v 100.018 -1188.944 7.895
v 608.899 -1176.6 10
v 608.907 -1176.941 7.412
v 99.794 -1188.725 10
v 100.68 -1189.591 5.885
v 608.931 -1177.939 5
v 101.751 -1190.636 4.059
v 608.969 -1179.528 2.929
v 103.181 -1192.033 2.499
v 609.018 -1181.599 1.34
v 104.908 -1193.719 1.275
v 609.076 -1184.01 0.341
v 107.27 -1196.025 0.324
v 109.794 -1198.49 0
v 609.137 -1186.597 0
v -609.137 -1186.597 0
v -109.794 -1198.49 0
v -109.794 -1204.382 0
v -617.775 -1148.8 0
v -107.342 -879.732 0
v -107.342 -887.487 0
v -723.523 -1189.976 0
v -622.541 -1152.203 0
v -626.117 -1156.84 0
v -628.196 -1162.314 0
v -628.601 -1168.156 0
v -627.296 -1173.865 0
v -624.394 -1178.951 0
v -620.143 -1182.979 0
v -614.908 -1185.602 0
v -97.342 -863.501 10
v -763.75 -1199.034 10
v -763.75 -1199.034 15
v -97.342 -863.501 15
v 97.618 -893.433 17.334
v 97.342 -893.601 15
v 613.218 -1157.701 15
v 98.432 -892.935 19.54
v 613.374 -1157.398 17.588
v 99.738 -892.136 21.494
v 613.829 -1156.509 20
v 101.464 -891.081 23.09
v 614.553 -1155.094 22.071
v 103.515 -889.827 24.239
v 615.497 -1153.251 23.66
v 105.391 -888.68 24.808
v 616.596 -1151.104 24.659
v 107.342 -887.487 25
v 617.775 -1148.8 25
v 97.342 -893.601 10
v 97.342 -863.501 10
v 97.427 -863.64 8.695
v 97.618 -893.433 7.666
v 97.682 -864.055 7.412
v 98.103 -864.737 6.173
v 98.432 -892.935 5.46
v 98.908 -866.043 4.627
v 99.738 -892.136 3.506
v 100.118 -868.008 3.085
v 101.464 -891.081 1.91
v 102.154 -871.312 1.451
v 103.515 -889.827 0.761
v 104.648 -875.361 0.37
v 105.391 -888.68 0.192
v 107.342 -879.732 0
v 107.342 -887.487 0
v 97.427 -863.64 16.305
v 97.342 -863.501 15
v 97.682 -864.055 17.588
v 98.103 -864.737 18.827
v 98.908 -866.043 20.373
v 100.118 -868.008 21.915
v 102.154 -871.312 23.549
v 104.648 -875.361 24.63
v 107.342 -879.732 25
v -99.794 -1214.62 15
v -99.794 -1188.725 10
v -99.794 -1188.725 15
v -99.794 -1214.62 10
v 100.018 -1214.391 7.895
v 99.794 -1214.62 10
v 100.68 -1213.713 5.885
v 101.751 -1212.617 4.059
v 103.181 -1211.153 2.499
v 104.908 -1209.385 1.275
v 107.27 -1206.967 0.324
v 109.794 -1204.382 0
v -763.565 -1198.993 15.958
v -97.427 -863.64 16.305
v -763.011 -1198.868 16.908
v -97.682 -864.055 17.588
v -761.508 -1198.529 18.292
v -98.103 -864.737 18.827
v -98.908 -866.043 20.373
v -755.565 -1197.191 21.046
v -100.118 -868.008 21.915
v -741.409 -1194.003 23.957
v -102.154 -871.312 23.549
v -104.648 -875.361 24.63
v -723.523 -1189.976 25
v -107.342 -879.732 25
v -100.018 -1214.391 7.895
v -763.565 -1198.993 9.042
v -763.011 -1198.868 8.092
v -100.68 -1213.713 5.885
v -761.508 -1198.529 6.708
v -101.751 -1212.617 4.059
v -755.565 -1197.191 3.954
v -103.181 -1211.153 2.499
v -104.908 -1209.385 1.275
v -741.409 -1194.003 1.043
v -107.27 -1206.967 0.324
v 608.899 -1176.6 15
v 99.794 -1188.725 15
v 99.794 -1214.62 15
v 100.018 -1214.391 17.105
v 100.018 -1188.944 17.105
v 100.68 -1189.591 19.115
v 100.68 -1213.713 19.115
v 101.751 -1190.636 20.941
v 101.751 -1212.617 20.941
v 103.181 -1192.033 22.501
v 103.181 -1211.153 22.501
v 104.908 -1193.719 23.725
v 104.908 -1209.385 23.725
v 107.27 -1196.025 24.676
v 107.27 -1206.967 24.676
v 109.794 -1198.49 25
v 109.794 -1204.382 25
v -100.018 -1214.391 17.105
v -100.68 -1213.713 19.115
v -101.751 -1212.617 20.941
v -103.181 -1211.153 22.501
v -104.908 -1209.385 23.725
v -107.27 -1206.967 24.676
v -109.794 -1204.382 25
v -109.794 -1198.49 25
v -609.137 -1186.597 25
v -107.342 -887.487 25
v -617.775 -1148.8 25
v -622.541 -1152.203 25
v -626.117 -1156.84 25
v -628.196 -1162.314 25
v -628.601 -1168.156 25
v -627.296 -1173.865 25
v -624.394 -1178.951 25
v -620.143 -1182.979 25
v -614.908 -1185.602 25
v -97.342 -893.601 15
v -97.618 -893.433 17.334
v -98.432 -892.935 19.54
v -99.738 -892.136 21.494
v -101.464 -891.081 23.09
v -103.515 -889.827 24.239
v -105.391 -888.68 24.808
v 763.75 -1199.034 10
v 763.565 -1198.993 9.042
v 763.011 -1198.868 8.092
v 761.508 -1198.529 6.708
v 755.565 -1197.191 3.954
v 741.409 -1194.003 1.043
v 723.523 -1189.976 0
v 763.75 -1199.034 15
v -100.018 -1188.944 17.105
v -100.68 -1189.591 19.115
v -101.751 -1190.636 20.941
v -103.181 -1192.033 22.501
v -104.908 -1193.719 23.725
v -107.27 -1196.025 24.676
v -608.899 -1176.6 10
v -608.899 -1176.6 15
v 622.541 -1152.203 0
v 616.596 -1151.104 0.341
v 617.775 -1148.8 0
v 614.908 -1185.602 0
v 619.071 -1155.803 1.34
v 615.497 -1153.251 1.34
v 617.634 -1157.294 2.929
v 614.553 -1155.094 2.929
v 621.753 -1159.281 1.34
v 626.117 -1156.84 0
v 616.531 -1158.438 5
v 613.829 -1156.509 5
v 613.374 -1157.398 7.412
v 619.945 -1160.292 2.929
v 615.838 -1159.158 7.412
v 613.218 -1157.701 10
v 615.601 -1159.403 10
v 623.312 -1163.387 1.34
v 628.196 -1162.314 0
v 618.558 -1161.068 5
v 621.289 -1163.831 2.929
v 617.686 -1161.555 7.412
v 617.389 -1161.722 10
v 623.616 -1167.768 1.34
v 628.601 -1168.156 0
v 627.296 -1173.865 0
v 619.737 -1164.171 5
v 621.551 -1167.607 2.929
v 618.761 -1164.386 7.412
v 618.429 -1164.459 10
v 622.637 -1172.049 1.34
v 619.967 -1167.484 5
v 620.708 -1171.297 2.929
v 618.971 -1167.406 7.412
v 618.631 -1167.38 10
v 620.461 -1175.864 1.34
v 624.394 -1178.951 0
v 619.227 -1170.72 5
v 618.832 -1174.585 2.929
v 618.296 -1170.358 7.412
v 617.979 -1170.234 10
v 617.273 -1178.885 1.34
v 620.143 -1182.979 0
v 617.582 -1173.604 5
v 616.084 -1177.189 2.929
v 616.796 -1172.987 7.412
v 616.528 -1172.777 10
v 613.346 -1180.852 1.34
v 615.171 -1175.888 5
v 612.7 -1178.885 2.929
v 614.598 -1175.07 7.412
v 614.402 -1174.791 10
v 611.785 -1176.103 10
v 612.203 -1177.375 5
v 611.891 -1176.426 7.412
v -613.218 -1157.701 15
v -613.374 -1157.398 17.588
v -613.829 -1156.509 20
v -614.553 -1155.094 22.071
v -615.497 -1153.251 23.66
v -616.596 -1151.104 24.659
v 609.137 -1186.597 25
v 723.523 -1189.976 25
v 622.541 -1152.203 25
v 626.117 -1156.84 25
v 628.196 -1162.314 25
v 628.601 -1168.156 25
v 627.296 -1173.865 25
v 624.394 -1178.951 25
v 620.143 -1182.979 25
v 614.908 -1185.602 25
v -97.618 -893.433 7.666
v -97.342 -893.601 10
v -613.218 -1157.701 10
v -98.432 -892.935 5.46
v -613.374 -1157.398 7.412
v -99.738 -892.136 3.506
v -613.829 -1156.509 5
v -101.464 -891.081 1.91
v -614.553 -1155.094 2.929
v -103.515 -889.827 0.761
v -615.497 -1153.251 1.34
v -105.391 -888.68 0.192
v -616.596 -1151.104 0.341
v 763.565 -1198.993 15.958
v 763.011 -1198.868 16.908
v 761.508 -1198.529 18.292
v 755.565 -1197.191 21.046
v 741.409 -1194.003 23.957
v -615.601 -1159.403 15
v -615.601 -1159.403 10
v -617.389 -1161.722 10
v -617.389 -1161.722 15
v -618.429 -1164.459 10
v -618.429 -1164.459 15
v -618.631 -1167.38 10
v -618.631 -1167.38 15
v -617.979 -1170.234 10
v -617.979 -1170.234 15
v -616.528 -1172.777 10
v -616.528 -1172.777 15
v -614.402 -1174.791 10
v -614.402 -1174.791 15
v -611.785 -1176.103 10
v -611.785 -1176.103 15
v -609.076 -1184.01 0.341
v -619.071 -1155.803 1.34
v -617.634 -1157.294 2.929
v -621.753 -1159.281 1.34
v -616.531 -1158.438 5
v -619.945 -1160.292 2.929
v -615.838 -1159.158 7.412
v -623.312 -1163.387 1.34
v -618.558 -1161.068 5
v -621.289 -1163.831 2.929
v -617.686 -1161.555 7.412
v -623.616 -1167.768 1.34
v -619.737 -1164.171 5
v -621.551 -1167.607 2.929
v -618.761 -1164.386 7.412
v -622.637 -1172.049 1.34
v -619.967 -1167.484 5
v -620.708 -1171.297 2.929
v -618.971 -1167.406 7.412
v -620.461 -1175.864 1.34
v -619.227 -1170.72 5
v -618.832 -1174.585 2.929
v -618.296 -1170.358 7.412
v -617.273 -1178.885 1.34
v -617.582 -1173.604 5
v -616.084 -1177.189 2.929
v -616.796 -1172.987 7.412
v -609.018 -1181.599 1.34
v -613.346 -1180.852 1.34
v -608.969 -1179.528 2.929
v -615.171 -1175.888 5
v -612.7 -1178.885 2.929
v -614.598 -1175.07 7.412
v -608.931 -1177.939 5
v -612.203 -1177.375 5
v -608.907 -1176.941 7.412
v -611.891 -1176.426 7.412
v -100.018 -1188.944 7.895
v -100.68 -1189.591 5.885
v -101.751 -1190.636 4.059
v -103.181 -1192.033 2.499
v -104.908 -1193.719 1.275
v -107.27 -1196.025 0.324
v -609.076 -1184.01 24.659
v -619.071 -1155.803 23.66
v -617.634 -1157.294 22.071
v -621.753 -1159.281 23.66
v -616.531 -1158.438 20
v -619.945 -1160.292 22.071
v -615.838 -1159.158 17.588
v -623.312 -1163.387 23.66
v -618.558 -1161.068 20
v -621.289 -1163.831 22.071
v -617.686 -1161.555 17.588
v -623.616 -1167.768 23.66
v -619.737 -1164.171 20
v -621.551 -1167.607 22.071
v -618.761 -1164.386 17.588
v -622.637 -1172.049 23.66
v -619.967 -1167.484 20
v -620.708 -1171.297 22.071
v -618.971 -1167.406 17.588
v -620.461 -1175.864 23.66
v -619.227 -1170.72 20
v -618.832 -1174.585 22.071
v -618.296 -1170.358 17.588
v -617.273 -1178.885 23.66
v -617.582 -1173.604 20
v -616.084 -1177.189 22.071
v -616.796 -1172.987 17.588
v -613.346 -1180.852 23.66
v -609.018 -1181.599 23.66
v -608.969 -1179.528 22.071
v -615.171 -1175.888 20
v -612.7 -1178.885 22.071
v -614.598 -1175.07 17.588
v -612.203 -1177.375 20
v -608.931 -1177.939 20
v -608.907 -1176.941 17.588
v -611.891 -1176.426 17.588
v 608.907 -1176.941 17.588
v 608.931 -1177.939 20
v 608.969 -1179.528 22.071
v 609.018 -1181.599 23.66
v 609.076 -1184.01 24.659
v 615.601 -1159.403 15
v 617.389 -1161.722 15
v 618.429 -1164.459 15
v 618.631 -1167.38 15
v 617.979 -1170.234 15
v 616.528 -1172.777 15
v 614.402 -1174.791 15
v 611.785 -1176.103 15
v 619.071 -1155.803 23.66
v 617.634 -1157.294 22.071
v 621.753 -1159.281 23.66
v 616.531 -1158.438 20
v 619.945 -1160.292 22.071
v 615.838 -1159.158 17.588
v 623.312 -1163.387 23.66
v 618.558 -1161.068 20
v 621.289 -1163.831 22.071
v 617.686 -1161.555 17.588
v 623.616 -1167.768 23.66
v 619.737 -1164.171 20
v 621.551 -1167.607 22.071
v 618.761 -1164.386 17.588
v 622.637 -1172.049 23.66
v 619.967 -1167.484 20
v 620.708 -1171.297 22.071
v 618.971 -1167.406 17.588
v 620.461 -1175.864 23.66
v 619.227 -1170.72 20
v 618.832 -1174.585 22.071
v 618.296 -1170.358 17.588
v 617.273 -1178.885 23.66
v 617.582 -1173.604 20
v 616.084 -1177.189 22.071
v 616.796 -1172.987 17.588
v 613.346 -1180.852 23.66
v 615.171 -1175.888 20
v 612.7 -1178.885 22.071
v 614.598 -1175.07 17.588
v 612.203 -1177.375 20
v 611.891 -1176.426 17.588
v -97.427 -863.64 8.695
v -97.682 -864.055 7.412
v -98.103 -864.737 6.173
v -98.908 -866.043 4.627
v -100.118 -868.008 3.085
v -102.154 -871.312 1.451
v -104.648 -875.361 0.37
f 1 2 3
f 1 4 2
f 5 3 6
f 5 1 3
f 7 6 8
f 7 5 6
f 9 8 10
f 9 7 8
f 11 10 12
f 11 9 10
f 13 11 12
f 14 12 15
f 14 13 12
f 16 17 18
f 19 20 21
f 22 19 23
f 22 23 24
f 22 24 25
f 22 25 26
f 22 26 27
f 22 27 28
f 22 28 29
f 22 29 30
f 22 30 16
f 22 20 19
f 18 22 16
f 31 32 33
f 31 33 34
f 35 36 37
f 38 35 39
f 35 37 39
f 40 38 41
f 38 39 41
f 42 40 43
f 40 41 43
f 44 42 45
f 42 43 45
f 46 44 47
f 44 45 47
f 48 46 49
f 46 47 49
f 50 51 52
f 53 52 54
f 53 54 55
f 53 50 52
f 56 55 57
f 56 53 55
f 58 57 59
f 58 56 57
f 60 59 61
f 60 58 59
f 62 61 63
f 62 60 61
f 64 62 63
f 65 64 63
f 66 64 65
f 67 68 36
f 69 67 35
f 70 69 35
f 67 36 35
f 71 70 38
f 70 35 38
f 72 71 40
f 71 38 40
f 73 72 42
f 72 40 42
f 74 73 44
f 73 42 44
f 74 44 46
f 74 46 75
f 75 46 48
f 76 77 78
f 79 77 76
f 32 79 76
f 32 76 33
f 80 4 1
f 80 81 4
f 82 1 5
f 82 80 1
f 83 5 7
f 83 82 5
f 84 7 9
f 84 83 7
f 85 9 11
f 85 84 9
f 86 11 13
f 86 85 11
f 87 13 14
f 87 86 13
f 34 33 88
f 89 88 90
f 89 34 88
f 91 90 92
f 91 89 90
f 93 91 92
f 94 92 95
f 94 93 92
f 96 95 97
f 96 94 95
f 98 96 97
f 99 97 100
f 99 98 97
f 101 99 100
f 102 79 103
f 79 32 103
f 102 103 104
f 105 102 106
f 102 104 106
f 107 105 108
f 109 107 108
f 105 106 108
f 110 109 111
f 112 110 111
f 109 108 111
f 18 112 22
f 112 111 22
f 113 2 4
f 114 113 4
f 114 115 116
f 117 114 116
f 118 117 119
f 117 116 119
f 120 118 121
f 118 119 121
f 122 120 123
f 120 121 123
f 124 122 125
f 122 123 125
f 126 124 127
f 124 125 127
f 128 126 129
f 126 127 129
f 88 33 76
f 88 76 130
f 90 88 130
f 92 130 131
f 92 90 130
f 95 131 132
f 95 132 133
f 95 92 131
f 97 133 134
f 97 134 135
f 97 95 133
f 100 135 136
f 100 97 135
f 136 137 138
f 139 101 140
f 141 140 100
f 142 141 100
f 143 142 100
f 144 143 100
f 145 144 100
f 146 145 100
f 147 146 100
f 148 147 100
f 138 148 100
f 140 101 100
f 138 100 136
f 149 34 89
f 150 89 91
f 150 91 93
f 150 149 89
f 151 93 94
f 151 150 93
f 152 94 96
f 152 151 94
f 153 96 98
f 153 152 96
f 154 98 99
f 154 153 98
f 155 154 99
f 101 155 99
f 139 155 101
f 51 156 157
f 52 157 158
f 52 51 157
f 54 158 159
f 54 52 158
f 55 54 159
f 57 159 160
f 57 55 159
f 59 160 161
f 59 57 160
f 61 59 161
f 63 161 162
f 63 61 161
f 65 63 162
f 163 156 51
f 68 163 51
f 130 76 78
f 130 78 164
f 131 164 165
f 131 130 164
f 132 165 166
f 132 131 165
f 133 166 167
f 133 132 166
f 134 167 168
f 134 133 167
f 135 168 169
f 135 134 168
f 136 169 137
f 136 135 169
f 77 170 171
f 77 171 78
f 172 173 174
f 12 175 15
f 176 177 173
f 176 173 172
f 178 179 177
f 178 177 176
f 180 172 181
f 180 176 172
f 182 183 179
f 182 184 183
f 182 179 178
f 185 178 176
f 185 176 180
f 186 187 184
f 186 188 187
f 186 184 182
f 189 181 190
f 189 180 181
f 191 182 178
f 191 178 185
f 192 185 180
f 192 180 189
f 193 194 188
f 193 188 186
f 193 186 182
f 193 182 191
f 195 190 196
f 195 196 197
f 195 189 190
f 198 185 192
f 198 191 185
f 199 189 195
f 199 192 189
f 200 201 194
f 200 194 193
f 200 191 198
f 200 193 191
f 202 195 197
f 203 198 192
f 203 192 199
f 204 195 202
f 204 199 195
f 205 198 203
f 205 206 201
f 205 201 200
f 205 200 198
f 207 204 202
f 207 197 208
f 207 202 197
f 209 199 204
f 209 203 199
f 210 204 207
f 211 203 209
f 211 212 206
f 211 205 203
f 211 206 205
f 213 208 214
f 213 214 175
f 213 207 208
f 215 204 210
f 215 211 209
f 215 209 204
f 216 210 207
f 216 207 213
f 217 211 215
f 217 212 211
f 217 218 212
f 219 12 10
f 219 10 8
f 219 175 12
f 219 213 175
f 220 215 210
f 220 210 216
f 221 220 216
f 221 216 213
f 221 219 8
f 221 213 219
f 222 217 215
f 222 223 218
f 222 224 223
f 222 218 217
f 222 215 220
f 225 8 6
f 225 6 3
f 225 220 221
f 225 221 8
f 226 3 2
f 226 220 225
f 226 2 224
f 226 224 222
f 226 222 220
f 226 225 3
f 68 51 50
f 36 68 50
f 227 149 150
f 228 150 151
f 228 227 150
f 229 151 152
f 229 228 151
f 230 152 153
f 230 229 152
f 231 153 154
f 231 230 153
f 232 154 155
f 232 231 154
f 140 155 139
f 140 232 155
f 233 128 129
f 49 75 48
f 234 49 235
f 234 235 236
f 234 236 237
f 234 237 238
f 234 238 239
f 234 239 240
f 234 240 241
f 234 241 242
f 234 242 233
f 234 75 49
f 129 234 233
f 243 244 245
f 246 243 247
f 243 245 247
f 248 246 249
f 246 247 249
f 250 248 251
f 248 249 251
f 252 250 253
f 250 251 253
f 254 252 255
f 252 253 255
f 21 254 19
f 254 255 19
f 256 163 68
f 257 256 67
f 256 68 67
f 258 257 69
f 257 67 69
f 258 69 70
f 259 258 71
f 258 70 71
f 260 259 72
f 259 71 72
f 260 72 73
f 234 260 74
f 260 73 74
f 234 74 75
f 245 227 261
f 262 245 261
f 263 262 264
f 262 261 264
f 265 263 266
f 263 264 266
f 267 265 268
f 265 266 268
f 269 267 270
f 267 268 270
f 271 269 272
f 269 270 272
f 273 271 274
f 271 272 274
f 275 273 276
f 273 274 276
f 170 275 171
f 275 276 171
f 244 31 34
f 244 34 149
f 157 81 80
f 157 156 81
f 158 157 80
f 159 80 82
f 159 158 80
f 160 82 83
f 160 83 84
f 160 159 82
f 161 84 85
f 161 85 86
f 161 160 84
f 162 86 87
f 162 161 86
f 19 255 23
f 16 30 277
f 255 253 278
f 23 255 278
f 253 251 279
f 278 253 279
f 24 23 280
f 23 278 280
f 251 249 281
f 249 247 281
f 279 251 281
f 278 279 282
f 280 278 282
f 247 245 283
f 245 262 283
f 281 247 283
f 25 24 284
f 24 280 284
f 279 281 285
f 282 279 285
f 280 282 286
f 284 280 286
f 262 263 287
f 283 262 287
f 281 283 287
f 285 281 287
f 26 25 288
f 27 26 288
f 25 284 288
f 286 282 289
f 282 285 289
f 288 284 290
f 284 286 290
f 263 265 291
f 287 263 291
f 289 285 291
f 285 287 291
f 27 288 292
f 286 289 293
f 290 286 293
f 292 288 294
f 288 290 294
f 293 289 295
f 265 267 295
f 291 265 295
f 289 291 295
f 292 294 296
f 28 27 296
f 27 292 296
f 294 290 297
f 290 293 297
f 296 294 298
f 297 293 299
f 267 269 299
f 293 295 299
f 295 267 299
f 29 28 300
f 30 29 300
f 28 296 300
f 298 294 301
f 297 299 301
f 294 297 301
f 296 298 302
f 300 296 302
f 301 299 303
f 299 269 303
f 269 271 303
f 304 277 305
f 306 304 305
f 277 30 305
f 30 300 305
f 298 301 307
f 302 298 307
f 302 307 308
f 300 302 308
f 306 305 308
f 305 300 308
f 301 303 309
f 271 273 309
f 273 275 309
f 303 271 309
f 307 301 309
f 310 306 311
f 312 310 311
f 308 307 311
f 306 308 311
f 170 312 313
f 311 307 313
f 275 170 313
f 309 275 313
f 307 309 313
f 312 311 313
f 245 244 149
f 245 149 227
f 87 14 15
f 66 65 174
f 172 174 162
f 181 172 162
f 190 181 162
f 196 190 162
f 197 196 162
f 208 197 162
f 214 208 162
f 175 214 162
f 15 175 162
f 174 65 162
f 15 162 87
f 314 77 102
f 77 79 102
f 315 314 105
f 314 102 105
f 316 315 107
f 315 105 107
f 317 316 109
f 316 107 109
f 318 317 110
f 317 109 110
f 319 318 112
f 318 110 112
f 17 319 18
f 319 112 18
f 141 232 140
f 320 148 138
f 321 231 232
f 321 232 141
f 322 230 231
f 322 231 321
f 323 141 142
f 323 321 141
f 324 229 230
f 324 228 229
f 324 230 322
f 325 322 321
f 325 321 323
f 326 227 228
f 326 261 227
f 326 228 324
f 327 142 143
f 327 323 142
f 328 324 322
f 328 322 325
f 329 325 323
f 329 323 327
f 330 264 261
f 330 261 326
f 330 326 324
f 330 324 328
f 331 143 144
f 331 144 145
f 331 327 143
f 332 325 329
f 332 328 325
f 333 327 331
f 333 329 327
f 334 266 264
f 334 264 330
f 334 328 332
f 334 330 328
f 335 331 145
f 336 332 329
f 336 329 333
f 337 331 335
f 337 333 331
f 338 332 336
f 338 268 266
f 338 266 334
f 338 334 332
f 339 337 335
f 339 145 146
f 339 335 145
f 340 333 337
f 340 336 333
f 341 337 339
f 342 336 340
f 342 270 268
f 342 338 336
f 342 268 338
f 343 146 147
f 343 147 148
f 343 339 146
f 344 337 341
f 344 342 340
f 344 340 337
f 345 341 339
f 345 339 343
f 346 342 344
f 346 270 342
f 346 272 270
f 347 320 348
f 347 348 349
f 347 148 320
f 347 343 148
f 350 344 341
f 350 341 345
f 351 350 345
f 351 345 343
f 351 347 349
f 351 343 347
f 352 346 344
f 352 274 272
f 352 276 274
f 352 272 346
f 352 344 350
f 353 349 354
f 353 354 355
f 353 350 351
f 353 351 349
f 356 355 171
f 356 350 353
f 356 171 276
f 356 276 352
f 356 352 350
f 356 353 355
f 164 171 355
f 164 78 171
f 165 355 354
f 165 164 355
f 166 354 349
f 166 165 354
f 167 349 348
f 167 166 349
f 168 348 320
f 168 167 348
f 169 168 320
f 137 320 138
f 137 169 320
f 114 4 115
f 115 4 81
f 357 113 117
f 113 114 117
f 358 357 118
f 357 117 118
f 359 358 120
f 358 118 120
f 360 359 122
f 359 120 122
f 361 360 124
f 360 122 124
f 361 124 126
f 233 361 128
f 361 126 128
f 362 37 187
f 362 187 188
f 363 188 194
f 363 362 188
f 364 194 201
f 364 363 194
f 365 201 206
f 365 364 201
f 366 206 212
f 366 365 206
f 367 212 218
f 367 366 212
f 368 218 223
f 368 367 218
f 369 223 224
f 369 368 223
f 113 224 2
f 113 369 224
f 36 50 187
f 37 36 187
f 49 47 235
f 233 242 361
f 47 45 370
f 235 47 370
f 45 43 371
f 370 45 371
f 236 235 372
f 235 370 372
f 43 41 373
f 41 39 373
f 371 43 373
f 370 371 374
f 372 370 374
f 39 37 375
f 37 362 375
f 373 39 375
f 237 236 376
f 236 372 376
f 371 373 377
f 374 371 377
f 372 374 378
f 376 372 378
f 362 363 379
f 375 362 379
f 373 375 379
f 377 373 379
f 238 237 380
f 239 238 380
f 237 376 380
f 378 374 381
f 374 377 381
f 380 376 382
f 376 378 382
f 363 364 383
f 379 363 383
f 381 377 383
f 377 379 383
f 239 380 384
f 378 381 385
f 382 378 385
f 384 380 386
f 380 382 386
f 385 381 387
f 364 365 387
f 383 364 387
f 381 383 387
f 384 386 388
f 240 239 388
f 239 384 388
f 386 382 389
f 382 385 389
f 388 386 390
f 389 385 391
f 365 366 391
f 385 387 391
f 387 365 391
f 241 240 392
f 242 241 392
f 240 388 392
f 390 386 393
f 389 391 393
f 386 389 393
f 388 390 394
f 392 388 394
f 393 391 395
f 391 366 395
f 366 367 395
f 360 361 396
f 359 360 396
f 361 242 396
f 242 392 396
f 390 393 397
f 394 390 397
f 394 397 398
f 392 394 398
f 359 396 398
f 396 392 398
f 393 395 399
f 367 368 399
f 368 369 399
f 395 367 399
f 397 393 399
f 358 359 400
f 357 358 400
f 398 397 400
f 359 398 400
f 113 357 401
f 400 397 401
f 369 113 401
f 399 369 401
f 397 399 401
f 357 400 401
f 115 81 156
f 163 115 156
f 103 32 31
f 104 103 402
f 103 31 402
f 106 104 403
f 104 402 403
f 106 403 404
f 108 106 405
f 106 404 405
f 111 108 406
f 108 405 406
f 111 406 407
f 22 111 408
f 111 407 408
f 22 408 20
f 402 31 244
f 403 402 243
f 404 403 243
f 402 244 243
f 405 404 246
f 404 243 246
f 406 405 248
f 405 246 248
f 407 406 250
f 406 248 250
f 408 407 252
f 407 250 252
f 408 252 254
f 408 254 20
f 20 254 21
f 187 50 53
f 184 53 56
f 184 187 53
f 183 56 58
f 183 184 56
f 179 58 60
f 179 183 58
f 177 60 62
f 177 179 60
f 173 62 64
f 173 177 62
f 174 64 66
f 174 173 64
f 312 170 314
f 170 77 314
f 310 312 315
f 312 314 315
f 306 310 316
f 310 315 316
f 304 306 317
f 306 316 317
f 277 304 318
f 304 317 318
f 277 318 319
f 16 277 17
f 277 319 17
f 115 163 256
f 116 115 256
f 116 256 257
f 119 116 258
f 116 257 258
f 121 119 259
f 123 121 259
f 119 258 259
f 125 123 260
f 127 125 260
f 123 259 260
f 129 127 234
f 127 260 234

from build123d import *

# Parameters (mm, degrees)
F1_DEPTH = 25
F2_R     = 10


with BuildPart() as f1:
    # F0 (on Top) → F1 (new body)
    with BuildSketch(Plane.XY):
        Polygon((763.750374, -1199.034214), (97.341686, -863.501491), (97.341686, -893.601477), (648.30035, -1175.661564), (99.794425, -1188.725471), (99.794425, -1214.619978), align=None)
    extrude(amount=F1_DEPTH)

    # F2
    f2_edges = [f1.edges().sort_by_distance(p)[0] for p in [
        (430.54603, -1031.267852, 25),
        (97.341686, -878.551484, 25),
        (372.821018, -1034.631521, 25),
        (374.047387, -1182.193518, 25),
        (99.794425, -1201.672725, 25),
        (431.7724, -1206.827096, 25),
        (430.54603, -1031.267852, 0),
        (97.341686, -878.551484, 0),
        (372.821018, -1034.631521, 0),
        (374.047387, -1182.193518, 0),
        (99.794425, -1201.672725, 0),
        (431.7724, -1206.827096, 0),
        (648.30035, -1175.661564, 12.5),
    ]]
    fillet(f2_edges, radius=F2_R)


with BuildPart() as f3_1:
    # F3: instance of F1
    add(f1.part.mirror(Plane.YZ))


solid = Compound([f1.part, f3_1.part])
